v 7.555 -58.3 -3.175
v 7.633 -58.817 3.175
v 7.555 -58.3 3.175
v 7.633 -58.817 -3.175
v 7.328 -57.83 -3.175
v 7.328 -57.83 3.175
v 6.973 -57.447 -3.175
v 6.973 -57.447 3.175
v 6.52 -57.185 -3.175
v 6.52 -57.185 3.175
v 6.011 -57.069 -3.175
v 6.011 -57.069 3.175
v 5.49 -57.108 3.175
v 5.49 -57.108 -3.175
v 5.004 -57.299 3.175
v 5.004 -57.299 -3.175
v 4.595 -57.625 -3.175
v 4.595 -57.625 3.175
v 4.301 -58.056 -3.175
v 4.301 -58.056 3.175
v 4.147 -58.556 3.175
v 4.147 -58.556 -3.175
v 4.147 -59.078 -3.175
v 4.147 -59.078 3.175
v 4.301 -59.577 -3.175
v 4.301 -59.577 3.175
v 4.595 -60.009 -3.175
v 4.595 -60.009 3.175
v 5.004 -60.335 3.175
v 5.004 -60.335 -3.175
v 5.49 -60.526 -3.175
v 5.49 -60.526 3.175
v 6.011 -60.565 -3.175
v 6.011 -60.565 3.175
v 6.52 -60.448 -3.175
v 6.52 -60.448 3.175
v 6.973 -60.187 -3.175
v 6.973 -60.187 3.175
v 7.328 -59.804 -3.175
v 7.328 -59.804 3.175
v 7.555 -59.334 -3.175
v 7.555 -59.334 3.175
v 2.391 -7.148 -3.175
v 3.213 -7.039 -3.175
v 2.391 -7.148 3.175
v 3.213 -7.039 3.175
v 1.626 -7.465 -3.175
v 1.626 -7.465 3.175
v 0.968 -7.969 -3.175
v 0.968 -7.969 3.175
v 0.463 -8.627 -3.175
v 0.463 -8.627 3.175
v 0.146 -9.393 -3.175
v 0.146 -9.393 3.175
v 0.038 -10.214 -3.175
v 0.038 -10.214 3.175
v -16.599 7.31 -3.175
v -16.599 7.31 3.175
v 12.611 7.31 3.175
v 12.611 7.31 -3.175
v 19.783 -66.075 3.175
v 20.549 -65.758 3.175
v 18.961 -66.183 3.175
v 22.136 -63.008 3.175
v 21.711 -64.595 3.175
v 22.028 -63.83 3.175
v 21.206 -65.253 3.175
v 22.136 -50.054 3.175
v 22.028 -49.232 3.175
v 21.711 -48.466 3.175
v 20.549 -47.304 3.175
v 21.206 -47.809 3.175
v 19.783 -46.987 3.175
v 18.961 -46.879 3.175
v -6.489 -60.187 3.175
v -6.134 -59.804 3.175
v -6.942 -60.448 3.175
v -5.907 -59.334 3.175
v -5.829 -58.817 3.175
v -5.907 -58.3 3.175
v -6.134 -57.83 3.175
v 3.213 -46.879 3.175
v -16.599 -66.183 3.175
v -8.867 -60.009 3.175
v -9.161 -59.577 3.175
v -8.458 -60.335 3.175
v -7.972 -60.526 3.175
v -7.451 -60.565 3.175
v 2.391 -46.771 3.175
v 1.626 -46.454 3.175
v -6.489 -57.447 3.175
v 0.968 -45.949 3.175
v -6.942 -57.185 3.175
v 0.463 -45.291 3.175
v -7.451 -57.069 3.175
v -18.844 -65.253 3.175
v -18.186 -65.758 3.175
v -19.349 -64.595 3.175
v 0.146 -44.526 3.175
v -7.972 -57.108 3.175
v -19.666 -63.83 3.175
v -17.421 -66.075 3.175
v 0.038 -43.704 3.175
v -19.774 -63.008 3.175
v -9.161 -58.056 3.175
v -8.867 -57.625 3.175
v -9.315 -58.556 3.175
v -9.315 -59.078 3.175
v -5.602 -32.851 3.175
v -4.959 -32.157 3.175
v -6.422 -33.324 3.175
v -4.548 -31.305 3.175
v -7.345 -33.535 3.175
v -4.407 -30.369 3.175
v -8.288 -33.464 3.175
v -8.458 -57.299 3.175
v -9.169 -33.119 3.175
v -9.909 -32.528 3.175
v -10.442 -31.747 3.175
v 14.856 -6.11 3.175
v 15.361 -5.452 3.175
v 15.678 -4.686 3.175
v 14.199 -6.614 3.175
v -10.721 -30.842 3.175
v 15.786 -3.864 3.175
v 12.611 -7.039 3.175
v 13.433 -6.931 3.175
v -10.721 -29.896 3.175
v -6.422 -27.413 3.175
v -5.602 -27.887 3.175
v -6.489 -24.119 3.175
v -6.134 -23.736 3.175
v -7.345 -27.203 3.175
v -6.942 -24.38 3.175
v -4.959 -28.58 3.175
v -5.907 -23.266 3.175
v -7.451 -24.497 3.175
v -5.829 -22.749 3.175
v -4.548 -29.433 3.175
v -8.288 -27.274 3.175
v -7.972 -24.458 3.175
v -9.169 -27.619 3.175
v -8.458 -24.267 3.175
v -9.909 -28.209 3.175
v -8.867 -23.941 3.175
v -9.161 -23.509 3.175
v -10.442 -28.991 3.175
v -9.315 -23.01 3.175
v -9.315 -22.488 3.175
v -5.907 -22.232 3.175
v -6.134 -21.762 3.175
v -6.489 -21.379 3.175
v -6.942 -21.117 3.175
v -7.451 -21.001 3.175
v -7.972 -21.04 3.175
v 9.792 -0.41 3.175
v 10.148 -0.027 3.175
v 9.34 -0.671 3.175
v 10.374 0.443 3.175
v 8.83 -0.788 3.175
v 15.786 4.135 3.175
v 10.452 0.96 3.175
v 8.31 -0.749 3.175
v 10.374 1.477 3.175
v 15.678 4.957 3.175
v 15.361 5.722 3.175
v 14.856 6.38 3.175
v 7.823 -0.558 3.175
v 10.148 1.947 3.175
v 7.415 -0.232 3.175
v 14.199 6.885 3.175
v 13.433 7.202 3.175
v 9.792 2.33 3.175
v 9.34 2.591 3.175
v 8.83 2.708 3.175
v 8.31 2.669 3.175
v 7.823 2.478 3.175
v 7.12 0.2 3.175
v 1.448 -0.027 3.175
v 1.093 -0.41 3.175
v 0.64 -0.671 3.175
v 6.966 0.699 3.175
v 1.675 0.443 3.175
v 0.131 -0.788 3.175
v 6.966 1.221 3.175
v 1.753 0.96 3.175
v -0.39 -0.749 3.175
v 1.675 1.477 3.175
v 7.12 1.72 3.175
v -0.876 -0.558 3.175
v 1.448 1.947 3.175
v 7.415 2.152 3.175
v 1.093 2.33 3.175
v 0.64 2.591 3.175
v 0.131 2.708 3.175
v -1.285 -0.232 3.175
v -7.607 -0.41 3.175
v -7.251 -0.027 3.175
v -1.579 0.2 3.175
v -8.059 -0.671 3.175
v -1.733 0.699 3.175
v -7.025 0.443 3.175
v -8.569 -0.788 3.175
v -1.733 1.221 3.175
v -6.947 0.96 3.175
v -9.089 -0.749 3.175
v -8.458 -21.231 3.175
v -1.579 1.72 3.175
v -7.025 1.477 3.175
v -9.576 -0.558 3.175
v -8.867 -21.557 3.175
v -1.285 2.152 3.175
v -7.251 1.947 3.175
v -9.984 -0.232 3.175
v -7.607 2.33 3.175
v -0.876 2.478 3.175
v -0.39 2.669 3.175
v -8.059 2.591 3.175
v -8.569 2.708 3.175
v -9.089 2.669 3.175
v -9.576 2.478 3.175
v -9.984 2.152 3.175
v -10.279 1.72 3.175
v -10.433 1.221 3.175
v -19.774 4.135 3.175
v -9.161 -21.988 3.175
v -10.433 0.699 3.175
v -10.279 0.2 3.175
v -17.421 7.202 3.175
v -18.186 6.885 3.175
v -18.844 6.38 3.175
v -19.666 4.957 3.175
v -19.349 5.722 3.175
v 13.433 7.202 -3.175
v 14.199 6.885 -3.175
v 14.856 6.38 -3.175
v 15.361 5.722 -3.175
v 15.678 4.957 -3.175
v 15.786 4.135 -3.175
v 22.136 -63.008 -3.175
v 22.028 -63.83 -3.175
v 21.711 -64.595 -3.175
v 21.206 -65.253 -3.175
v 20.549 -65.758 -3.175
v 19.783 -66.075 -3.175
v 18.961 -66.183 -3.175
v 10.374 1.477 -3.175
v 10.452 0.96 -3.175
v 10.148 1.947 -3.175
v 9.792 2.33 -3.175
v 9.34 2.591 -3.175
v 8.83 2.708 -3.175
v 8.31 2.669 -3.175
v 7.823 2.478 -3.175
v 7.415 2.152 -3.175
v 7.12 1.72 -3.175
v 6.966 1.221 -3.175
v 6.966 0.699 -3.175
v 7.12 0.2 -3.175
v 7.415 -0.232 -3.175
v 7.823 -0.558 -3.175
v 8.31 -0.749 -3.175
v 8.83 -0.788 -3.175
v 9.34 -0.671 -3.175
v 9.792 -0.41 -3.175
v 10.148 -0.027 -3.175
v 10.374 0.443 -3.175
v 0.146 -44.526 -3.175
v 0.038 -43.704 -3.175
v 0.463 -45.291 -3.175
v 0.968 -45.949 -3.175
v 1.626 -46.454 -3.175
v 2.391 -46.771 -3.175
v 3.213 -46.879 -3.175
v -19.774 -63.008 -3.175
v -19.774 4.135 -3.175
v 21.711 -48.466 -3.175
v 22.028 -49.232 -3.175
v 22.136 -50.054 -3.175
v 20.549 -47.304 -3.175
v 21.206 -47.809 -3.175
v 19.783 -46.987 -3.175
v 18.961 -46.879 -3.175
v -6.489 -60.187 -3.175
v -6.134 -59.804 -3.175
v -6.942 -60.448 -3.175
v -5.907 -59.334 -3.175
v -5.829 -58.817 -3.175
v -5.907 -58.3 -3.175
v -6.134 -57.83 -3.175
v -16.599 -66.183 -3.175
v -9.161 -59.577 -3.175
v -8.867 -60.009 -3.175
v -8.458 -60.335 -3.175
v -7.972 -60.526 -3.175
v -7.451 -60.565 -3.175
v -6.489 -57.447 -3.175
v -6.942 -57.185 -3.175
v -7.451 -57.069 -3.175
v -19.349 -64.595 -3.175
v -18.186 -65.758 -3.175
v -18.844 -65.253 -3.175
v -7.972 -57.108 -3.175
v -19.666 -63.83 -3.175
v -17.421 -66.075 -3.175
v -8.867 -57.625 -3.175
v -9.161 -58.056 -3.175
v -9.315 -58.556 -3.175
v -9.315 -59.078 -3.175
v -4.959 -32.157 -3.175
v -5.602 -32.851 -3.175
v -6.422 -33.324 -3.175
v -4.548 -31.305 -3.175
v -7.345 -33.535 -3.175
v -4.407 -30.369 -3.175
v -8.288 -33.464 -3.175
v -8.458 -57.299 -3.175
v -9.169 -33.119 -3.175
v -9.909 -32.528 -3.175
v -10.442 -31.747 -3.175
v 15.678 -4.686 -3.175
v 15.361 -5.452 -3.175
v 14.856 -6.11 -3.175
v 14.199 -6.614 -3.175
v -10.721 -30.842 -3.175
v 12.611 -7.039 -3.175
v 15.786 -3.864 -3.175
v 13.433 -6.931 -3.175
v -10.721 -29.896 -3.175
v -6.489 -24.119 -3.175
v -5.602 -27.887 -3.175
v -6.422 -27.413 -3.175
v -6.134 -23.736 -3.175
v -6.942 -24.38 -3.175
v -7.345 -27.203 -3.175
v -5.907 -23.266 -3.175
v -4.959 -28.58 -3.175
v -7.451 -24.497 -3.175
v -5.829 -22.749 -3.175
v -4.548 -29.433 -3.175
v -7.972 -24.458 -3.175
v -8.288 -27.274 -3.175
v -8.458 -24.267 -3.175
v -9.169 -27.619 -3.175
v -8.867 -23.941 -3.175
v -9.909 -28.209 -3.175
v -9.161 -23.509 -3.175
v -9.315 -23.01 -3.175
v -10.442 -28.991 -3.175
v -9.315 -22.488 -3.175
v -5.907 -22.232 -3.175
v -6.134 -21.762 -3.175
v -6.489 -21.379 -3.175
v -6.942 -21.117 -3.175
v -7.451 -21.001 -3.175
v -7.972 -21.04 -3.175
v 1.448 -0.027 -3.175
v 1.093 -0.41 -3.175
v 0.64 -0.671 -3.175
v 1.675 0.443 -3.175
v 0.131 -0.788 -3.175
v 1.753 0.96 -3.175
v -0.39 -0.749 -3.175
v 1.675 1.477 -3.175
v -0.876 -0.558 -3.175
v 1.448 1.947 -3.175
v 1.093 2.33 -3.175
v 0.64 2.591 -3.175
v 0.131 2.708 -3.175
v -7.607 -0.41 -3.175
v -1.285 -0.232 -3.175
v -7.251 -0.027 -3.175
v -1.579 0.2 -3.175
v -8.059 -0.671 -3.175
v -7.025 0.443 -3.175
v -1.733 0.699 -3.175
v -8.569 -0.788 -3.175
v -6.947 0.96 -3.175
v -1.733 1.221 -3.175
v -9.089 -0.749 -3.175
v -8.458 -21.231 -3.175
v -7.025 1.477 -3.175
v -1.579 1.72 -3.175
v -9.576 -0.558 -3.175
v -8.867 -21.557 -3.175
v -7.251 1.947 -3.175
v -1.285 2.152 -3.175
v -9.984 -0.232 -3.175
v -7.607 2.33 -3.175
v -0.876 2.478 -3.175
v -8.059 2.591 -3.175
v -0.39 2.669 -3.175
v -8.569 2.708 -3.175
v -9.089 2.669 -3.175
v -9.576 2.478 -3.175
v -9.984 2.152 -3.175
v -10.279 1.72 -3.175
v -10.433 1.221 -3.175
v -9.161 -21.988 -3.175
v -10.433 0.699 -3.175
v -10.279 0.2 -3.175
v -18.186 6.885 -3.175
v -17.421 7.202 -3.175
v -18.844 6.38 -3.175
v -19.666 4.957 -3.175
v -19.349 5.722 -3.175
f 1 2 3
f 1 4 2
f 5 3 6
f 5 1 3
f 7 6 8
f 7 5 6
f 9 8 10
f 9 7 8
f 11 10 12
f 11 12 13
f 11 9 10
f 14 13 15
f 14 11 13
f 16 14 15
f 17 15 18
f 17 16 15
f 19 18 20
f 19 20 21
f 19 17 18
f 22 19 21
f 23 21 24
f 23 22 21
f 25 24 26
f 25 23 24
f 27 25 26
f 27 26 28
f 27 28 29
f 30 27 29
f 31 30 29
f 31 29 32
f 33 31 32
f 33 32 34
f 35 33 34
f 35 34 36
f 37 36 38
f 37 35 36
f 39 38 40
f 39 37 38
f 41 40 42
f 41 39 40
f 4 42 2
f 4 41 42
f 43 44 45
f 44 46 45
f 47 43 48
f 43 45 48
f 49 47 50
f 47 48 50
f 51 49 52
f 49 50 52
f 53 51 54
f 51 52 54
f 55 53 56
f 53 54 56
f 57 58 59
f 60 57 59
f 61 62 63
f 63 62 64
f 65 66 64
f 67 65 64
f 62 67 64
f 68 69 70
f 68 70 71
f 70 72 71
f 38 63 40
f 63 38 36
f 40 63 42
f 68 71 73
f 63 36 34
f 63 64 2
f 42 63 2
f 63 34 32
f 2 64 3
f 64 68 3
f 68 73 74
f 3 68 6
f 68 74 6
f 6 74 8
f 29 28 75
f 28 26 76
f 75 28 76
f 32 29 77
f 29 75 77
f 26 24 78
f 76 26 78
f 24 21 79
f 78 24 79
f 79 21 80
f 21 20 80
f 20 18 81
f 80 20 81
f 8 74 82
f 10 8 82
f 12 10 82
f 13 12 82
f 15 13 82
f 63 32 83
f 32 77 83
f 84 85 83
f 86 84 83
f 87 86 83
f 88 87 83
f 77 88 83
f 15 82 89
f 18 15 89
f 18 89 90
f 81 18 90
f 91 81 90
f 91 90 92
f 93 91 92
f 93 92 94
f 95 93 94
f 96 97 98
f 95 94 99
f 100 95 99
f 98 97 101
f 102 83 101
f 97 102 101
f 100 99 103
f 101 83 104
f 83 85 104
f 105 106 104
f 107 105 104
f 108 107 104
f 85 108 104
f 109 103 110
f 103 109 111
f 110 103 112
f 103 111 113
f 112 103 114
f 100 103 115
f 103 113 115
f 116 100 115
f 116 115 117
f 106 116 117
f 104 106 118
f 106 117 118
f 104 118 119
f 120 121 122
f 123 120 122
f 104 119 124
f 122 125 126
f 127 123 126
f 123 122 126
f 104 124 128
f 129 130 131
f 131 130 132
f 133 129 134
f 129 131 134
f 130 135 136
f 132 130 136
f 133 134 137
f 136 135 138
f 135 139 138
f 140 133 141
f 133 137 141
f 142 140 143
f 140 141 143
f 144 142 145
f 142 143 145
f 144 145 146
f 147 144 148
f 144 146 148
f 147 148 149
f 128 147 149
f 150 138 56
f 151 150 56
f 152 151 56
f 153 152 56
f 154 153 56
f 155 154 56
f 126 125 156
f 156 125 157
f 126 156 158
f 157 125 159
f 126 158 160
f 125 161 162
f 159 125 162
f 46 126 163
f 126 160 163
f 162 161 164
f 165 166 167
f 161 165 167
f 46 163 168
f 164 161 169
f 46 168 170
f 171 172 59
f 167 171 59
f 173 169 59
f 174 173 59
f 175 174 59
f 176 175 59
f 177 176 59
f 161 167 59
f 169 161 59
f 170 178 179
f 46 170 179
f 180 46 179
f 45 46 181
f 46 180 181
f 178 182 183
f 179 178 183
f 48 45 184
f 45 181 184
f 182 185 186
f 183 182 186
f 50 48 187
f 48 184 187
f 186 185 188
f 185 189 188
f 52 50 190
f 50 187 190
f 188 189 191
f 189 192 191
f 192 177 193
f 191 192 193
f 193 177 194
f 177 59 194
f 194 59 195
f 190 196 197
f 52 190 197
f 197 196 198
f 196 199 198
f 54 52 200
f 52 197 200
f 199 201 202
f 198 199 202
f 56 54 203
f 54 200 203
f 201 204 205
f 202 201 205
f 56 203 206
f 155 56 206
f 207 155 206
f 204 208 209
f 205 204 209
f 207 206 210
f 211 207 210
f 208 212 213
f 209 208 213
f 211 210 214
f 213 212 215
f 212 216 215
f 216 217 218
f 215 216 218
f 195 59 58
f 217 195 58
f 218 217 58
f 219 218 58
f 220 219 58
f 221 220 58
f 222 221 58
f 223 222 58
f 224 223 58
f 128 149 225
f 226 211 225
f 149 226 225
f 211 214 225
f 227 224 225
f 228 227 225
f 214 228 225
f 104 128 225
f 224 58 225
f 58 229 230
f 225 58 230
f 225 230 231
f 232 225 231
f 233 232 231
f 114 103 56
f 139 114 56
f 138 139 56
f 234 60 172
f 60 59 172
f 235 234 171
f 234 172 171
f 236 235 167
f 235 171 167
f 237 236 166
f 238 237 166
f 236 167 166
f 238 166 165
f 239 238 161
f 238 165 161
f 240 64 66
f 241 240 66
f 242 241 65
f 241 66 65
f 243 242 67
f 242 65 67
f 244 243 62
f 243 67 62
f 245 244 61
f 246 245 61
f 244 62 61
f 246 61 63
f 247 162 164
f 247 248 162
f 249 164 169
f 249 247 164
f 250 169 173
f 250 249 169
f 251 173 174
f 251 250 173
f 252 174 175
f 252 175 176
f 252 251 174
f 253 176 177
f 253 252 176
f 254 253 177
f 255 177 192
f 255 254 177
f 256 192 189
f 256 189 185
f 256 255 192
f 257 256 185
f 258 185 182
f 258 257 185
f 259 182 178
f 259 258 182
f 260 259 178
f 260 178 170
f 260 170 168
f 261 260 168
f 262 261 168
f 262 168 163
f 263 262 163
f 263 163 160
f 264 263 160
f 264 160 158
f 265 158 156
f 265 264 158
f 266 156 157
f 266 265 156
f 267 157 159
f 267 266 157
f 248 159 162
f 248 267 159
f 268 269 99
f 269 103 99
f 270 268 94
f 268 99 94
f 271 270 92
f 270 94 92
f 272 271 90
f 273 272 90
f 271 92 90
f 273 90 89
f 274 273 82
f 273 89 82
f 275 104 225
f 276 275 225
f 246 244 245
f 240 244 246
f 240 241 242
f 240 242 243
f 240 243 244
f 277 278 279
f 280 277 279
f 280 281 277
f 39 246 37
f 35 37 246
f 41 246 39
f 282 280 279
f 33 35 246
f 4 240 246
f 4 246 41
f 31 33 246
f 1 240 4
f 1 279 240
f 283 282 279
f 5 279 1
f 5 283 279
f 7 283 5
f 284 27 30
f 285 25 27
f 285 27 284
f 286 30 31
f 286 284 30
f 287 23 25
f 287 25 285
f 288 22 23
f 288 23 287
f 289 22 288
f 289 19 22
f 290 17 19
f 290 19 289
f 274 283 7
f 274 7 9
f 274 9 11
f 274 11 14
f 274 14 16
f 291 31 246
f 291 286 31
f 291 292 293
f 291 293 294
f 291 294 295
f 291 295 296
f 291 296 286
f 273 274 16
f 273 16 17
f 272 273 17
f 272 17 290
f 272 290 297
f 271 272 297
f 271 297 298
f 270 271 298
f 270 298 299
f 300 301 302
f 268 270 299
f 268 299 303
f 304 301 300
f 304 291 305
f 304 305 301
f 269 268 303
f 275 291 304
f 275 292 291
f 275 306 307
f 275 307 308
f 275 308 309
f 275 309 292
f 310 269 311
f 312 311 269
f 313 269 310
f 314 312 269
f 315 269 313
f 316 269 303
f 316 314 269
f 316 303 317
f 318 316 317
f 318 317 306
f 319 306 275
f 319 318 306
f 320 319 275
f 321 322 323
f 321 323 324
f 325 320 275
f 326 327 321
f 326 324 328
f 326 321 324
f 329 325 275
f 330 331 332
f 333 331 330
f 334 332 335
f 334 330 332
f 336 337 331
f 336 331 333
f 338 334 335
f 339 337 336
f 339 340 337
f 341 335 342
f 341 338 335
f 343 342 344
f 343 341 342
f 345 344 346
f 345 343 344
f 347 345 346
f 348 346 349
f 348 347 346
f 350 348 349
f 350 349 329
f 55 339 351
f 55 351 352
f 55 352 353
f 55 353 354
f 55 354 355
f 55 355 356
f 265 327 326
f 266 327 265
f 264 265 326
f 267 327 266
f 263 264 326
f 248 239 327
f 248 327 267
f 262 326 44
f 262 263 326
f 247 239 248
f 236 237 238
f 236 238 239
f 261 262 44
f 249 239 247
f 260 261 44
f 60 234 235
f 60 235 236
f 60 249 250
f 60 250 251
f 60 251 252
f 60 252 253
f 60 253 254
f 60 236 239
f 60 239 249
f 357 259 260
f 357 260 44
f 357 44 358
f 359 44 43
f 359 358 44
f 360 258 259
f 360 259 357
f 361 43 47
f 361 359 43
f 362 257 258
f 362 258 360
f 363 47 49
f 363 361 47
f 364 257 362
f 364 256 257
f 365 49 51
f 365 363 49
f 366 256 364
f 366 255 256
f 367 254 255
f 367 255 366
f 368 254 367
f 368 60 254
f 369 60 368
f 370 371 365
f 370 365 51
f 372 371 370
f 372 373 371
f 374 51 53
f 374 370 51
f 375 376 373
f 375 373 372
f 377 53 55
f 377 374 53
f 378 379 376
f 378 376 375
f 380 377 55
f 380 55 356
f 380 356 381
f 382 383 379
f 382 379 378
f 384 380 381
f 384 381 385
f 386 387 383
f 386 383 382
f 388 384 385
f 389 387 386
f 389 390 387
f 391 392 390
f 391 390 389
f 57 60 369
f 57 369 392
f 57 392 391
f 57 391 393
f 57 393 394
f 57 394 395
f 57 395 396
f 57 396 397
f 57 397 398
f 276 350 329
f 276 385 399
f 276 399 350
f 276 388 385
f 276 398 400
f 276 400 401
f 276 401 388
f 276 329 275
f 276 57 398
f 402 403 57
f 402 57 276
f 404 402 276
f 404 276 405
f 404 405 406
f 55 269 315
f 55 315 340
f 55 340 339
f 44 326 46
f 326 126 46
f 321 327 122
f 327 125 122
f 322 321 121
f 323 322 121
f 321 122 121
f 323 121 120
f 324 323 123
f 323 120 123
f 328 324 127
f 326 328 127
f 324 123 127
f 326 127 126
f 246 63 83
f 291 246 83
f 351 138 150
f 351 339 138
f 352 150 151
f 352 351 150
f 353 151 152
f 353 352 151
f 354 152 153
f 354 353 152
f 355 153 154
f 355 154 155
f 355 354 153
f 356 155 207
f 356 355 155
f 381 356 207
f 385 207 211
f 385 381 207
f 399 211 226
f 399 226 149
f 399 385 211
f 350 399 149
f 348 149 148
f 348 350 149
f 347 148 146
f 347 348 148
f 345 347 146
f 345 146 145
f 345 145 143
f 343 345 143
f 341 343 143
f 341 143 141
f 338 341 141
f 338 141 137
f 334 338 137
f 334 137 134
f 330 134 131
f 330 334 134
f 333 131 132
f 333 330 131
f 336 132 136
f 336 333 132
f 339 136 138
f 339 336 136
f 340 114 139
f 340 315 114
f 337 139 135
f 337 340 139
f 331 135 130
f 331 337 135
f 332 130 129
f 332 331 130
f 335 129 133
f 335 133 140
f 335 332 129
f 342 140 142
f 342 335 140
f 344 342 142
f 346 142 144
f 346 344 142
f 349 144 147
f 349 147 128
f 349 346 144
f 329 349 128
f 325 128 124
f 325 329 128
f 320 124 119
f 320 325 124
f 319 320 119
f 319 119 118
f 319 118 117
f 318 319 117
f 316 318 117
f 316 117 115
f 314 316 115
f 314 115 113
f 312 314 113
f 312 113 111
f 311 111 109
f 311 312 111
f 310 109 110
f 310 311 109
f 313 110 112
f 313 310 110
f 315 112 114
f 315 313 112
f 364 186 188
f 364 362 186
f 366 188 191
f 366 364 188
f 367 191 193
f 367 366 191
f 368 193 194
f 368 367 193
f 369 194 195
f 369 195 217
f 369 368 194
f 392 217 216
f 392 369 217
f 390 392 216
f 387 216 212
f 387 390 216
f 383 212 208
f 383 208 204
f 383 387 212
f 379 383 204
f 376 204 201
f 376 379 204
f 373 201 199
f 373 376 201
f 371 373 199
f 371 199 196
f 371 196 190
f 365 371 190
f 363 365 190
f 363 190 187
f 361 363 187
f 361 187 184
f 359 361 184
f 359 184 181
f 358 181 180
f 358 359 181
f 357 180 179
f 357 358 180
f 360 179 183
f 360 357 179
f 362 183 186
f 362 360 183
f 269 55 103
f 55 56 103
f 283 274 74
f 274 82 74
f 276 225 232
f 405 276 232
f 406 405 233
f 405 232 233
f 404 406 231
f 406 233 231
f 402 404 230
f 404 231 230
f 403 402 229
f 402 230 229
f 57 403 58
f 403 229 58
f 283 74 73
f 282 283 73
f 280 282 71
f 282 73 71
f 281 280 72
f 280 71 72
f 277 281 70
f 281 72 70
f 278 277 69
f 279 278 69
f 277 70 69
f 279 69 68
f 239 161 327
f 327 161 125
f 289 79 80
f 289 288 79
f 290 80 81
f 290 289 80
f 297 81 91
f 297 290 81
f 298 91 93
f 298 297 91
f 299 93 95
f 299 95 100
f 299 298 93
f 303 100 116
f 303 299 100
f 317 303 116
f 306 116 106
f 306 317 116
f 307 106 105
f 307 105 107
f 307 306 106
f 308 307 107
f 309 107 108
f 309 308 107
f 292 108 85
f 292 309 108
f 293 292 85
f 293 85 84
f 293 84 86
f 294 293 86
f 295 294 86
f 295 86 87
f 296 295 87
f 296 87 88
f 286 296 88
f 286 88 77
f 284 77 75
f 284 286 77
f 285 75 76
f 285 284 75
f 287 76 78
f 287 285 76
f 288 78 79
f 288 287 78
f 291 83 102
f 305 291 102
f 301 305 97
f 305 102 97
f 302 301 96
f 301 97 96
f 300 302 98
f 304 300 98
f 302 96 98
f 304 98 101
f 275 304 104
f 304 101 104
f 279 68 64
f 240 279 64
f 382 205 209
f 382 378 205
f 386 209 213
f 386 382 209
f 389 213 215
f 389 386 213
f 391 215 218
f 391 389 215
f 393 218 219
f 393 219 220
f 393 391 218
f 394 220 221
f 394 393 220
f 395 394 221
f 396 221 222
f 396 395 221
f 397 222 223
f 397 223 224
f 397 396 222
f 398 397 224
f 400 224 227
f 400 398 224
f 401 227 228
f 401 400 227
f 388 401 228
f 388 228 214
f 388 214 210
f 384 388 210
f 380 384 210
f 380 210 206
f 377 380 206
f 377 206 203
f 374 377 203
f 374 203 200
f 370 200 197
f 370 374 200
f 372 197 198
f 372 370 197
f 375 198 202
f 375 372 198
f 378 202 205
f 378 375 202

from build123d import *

# Parameters (mm, degrees)
SKETCH1_R           = 1.7526
SKETCH1_R_2         = 3.175
BOSS_EXTRUDE1_DEPTH = 3.175


with BuildPart() as part:
    # Sketch1 → Boss-Extrude1 (new, symmetric)
    with BuildSketch(Plane.XY):
        with BuildLine():
            Line((-16.5989, 7.309993), (12.6111, 7.309993))
            ThreePointArc((12.6111, 7.309993), (14.85616403, 6.38005703), (15.7861, 4.134993))
            Line((15.7861, 4.134993), (15.7861, -3.864460368))
            ThreePointArc((15.7861, -3.864460368), (14.85616403, -6.109524399), (12.6111, -7.039460368))
            Line((12.6111, -7.039460368), (3.2131, -7.039460368))
            ThreePointArc((3.2131, -7.039460368), (0.96803597, -7.969396338), (0.0381, -10.214460368))
            Line((0.0381, -10.214460368), (0.0381, -43.70392319))
            ThreePointArc((0.0381, -43.70392319), (0.96803597, -45.948987221), (3.2131, -46.87892319))
            Line((3.2131, -46.87892319), (18.9611, -46.87892319))
            ThreePointArc((18.9611, -46.87892319), (21.20616403, -47.80885916), (22.1361, -50.05392319))
            Line((22.1361, -50.05392319), (22.1361, -63.00792319))
            ThreePointArc((22.1361, -63.00792319), (21.20616403, -65.252987221), (18.9611, -66.18292319))
            Line((18.9611, -66.18292319), (-16.5989, -66.18292319))
            ThreePointArc((-16.5989, -66.18292319), (-18.84396403, -65.252987221), (-19.7739, -63.00792319))
            Line((-19.7739, -63.00792319), (-19.7739, 4.134993))
            ThreePointArc((-19.7739, 4.134993), (-18.84396403, 6.38005703), (-16.5989, 7.309993))
        make_face()
        with Locations((-8.6995, 0.959993)):
            Circle(SKETCH1_R, mode=Mode.SUBTRACT)
        with Locations((8.6995, 0.959993)):
            Circle(SKETCH1_R, mode=Mode.SUBTRACT)
        with Locations((-7.5819, -22.74892319)):
            Circle(SKETCH1_R, mode=Mode.SUBTRACT)
        with Locations((-7.5819, -30.36892319)):
            Circle(SKETCH1_R_2, mode=Mode.SUBTRACT)
        with Locations((-7.5819, -58.81692319)):
            Circle(SKETCH1_R, mode=Mode.SUBTRACT)
        with Locations((5.8801, -58.81692319)):
            Circle(SKETCH1_R, mode=Mode.SUBTRACT)
        with Locations((0, 0.959993)):
            Circle(SKETCH1_R, mode=Mode.SUBTRACT)
    extrude(amount=BOSS_EXTRUDE1_DEPTH, both=True)


solid = part.part
